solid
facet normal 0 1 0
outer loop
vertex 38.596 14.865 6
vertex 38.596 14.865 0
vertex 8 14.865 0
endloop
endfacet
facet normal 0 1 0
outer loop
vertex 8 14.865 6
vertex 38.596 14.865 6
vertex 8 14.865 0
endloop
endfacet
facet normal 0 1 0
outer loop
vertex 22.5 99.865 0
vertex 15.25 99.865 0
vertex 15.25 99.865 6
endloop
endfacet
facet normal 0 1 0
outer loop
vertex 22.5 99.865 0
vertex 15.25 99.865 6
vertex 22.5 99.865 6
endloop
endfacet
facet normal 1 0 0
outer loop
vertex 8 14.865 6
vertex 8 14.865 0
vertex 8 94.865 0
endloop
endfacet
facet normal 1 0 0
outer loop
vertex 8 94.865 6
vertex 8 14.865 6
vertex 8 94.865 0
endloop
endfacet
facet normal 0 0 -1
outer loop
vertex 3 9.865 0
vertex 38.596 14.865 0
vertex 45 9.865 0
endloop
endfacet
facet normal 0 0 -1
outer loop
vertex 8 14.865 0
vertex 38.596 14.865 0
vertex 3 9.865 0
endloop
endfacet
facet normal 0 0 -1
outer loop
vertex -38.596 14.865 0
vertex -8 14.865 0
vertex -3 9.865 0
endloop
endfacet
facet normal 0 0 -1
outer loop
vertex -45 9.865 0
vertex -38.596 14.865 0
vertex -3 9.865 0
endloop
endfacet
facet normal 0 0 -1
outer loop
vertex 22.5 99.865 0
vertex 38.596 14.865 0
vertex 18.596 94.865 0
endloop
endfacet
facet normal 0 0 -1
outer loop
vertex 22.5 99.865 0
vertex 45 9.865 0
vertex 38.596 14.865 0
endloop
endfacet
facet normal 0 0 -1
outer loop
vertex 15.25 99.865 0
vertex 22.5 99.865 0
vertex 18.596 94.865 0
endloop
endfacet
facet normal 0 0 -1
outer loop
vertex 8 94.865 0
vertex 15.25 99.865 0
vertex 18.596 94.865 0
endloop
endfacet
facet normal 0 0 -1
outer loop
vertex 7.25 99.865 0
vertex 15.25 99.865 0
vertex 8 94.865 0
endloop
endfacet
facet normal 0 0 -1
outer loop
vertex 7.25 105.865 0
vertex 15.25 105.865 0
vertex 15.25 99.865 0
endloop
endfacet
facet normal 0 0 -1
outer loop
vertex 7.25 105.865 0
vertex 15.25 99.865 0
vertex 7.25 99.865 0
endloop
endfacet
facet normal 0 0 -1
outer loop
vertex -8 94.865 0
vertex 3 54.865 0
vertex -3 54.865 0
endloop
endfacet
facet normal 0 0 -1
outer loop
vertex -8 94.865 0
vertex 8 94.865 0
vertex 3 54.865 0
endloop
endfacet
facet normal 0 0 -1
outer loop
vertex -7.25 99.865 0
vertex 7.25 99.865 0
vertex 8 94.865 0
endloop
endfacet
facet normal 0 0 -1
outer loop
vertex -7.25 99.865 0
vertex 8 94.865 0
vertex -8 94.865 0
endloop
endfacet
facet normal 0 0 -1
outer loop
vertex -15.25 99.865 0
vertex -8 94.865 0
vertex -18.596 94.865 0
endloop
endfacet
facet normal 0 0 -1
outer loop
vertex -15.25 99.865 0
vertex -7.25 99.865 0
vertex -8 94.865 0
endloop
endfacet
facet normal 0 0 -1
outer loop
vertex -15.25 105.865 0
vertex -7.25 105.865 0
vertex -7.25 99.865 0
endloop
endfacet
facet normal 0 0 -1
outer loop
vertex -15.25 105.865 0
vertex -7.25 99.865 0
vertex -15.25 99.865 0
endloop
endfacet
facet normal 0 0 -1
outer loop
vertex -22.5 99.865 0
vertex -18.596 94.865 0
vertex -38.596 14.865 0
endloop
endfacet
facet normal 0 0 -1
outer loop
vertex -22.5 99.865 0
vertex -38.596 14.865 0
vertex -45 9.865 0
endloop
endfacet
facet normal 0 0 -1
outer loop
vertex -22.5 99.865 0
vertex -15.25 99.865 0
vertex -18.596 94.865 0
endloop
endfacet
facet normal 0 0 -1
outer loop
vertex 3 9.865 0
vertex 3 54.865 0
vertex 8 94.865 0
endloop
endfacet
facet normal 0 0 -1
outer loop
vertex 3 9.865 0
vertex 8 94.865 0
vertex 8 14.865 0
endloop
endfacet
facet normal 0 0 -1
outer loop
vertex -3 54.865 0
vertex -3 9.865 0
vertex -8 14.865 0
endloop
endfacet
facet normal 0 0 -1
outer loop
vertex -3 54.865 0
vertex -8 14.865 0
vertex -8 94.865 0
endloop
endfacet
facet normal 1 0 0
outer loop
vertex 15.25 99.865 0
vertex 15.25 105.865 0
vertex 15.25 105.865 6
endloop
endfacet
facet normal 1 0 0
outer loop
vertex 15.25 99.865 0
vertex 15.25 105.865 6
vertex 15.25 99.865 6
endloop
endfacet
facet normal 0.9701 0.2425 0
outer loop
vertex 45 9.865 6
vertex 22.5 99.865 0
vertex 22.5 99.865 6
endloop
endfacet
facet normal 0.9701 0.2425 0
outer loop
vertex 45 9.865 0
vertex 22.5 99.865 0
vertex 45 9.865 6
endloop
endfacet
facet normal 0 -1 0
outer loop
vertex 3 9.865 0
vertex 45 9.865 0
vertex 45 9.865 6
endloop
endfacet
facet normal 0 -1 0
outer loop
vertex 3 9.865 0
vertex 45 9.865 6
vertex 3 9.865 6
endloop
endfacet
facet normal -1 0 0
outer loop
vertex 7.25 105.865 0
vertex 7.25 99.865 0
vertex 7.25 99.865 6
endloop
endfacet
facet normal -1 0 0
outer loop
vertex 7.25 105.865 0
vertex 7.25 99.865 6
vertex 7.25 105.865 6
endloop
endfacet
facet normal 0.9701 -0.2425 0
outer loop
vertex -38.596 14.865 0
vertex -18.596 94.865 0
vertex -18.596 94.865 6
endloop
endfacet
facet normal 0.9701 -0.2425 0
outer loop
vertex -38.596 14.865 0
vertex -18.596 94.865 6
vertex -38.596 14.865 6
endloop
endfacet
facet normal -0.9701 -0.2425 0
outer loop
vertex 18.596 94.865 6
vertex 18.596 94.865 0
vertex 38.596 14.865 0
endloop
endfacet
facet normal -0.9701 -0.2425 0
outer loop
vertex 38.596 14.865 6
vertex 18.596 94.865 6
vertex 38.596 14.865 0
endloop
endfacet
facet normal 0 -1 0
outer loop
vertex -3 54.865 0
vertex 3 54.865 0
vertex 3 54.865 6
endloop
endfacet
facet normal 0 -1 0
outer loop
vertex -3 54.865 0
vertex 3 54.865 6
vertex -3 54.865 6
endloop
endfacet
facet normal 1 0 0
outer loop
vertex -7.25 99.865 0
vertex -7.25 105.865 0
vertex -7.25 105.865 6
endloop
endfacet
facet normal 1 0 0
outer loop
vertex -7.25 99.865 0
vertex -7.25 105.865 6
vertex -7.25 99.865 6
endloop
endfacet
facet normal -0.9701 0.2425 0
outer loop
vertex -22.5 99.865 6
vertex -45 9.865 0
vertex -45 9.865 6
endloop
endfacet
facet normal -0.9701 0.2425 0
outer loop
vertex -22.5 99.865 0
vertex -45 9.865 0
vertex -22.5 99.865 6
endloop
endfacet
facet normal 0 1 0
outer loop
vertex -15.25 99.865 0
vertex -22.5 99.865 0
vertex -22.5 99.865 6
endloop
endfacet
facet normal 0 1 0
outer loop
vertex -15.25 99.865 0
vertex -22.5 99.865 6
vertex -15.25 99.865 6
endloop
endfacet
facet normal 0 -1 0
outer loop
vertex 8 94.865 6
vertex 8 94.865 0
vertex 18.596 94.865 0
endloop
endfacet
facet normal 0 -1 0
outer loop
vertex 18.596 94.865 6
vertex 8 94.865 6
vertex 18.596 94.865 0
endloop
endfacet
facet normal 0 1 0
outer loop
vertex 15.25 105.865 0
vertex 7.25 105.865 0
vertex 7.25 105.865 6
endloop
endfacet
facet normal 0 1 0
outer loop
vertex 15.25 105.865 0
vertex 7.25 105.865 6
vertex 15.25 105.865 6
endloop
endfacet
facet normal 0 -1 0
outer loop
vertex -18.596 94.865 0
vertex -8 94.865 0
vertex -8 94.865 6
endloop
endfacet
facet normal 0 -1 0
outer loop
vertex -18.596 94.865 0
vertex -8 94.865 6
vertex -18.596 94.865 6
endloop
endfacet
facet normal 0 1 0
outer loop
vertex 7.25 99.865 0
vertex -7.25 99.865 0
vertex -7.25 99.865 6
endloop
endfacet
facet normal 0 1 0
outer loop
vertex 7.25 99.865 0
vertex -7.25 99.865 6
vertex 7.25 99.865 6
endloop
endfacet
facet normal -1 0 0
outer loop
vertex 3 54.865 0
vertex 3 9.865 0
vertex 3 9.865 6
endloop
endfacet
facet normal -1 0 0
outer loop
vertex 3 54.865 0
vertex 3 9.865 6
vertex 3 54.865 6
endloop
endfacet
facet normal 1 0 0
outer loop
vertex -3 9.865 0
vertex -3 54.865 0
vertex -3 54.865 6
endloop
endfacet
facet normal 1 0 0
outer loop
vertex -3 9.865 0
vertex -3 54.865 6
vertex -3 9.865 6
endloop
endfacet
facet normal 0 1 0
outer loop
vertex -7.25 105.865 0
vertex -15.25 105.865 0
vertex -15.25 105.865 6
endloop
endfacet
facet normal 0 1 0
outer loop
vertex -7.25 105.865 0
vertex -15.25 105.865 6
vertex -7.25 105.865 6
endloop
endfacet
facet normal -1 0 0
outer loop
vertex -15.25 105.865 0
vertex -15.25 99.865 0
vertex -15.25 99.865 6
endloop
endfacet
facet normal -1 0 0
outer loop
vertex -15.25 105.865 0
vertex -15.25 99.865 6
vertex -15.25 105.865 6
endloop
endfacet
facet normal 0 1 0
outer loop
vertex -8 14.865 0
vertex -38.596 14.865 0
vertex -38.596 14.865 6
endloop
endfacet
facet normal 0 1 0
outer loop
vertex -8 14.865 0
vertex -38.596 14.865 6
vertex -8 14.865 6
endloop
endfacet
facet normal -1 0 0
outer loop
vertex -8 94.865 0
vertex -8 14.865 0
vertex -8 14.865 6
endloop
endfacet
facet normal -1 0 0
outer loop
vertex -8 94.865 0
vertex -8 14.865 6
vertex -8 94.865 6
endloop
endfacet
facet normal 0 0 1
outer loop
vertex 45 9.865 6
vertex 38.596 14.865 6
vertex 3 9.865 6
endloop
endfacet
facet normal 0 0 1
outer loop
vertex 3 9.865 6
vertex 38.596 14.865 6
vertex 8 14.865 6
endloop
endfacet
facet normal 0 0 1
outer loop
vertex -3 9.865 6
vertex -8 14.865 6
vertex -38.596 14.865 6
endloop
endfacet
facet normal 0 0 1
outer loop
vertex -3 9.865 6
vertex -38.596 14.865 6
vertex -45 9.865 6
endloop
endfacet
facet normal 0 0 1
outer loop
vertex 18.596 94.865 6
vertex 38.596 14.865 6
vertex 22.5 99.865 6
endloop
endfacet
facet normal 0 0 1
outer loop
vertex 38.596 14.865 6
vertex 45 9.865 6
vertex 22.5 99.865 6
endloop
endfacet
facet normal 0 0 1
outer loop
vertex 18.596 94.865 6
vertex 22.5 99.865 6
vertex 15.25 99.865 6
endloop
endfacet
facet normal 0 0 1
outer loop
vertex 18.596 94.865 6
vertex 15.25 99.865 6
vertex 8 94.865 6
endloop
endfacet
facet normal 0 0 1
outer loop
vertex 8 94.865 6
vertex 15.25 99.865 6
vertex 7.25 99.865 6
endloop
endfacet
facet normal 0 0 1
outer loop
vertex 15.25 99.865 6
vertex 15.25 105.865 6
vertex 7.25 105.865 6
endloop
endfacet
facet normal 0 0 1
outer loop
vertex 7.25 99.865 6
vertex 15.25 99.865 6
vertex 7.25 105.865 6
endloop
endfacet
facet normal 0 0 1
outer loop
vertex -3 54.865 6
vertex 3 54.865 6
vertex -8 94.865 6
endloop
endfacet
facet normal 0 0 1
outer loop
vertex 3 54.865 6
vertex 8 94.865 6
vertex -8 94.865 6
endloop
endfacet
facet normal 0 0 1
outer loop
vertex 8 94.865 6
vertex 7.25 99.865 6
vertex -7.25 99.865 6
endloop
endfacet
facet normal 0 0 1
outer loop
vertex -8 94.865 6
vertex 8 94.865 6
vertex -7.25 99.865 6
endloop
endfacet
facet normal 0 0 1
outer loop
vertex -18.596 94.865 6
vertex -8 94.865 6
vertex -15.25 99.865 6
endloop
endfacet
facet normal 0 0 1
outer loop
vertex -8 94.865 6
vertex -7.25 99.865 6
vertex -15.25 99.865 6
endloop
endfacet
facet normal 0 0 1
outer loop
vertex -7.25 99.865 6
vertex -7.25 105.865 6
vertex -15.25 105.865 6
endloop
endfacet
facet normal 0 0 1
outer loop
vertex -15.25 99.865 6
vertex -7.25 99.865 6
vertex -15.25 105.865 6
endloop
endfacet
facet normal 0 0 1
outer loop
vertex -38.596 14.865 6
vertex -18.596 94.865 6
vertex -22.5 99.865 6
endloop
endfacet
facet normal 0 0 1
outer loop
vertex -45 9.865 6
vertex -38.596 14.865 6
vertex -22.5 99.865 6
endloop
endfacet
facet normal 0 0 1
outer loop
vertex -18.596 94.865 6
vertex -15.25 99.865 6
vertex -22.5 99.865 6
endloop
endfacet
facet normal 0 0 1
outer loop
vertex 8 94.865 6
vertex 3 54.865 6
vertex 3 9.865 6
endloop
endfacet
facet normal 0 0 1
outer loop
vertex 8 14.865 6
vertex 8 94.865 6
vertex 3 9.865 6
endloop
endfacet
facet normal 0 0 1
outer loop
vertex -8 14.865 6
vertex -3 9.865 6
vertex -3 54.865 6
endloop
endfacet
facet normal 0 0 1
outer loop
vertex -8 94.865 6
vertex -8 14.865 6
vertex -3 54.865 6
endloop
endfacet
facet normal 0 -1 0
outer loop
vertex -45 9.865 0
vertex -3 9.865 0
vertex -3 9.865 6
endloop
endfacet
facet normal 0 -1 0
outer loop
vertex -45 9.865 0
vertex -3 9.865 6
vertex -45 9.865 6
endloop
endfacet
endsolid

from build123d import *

# Parameters (mm, degrees)
BOSS_EXTRUDE4_DEPTH = 6


with BuildPart() as part:
    # Sketch2 → Boss-Extrude4 (new body)
    with BuildSketch(Plane.XY):
        Polygon((45, 9.865384615), (3, 9.865384615), (3, 54.865384615), (-3, 54.865384615), (-3, 9.865384615), (-45, 9.865384615), (-22.5, 99.865384615), (-15.25, 99.865384615), (-15.25, 105.865384615), (-7.25, 105.865384615), (-7.25, 99.865384615), (7.25, 99.865384615), (7.25, 105.865384615), (15.25, 105.865384615), (15.25, 99.865384615), (22.5, 99.865384615), align=None)
        Polygon((-8, 94.865384615), (-18.596117968, 94.865384615), (-38.596117968, 14.865384615), (-8, 14.865384615), align=None, mode=Mode.SUBTRACT)
        Polygon((38.596117968, 14.865384615), (8, 14.865384615), (8, 94.865384615), (18.596117968, 94.865384615), align=None, mode=Mode.SUBTRACT)
    extrude(amount=BOSS_EXTRUDE4_DEPTH)


solid = part.part
